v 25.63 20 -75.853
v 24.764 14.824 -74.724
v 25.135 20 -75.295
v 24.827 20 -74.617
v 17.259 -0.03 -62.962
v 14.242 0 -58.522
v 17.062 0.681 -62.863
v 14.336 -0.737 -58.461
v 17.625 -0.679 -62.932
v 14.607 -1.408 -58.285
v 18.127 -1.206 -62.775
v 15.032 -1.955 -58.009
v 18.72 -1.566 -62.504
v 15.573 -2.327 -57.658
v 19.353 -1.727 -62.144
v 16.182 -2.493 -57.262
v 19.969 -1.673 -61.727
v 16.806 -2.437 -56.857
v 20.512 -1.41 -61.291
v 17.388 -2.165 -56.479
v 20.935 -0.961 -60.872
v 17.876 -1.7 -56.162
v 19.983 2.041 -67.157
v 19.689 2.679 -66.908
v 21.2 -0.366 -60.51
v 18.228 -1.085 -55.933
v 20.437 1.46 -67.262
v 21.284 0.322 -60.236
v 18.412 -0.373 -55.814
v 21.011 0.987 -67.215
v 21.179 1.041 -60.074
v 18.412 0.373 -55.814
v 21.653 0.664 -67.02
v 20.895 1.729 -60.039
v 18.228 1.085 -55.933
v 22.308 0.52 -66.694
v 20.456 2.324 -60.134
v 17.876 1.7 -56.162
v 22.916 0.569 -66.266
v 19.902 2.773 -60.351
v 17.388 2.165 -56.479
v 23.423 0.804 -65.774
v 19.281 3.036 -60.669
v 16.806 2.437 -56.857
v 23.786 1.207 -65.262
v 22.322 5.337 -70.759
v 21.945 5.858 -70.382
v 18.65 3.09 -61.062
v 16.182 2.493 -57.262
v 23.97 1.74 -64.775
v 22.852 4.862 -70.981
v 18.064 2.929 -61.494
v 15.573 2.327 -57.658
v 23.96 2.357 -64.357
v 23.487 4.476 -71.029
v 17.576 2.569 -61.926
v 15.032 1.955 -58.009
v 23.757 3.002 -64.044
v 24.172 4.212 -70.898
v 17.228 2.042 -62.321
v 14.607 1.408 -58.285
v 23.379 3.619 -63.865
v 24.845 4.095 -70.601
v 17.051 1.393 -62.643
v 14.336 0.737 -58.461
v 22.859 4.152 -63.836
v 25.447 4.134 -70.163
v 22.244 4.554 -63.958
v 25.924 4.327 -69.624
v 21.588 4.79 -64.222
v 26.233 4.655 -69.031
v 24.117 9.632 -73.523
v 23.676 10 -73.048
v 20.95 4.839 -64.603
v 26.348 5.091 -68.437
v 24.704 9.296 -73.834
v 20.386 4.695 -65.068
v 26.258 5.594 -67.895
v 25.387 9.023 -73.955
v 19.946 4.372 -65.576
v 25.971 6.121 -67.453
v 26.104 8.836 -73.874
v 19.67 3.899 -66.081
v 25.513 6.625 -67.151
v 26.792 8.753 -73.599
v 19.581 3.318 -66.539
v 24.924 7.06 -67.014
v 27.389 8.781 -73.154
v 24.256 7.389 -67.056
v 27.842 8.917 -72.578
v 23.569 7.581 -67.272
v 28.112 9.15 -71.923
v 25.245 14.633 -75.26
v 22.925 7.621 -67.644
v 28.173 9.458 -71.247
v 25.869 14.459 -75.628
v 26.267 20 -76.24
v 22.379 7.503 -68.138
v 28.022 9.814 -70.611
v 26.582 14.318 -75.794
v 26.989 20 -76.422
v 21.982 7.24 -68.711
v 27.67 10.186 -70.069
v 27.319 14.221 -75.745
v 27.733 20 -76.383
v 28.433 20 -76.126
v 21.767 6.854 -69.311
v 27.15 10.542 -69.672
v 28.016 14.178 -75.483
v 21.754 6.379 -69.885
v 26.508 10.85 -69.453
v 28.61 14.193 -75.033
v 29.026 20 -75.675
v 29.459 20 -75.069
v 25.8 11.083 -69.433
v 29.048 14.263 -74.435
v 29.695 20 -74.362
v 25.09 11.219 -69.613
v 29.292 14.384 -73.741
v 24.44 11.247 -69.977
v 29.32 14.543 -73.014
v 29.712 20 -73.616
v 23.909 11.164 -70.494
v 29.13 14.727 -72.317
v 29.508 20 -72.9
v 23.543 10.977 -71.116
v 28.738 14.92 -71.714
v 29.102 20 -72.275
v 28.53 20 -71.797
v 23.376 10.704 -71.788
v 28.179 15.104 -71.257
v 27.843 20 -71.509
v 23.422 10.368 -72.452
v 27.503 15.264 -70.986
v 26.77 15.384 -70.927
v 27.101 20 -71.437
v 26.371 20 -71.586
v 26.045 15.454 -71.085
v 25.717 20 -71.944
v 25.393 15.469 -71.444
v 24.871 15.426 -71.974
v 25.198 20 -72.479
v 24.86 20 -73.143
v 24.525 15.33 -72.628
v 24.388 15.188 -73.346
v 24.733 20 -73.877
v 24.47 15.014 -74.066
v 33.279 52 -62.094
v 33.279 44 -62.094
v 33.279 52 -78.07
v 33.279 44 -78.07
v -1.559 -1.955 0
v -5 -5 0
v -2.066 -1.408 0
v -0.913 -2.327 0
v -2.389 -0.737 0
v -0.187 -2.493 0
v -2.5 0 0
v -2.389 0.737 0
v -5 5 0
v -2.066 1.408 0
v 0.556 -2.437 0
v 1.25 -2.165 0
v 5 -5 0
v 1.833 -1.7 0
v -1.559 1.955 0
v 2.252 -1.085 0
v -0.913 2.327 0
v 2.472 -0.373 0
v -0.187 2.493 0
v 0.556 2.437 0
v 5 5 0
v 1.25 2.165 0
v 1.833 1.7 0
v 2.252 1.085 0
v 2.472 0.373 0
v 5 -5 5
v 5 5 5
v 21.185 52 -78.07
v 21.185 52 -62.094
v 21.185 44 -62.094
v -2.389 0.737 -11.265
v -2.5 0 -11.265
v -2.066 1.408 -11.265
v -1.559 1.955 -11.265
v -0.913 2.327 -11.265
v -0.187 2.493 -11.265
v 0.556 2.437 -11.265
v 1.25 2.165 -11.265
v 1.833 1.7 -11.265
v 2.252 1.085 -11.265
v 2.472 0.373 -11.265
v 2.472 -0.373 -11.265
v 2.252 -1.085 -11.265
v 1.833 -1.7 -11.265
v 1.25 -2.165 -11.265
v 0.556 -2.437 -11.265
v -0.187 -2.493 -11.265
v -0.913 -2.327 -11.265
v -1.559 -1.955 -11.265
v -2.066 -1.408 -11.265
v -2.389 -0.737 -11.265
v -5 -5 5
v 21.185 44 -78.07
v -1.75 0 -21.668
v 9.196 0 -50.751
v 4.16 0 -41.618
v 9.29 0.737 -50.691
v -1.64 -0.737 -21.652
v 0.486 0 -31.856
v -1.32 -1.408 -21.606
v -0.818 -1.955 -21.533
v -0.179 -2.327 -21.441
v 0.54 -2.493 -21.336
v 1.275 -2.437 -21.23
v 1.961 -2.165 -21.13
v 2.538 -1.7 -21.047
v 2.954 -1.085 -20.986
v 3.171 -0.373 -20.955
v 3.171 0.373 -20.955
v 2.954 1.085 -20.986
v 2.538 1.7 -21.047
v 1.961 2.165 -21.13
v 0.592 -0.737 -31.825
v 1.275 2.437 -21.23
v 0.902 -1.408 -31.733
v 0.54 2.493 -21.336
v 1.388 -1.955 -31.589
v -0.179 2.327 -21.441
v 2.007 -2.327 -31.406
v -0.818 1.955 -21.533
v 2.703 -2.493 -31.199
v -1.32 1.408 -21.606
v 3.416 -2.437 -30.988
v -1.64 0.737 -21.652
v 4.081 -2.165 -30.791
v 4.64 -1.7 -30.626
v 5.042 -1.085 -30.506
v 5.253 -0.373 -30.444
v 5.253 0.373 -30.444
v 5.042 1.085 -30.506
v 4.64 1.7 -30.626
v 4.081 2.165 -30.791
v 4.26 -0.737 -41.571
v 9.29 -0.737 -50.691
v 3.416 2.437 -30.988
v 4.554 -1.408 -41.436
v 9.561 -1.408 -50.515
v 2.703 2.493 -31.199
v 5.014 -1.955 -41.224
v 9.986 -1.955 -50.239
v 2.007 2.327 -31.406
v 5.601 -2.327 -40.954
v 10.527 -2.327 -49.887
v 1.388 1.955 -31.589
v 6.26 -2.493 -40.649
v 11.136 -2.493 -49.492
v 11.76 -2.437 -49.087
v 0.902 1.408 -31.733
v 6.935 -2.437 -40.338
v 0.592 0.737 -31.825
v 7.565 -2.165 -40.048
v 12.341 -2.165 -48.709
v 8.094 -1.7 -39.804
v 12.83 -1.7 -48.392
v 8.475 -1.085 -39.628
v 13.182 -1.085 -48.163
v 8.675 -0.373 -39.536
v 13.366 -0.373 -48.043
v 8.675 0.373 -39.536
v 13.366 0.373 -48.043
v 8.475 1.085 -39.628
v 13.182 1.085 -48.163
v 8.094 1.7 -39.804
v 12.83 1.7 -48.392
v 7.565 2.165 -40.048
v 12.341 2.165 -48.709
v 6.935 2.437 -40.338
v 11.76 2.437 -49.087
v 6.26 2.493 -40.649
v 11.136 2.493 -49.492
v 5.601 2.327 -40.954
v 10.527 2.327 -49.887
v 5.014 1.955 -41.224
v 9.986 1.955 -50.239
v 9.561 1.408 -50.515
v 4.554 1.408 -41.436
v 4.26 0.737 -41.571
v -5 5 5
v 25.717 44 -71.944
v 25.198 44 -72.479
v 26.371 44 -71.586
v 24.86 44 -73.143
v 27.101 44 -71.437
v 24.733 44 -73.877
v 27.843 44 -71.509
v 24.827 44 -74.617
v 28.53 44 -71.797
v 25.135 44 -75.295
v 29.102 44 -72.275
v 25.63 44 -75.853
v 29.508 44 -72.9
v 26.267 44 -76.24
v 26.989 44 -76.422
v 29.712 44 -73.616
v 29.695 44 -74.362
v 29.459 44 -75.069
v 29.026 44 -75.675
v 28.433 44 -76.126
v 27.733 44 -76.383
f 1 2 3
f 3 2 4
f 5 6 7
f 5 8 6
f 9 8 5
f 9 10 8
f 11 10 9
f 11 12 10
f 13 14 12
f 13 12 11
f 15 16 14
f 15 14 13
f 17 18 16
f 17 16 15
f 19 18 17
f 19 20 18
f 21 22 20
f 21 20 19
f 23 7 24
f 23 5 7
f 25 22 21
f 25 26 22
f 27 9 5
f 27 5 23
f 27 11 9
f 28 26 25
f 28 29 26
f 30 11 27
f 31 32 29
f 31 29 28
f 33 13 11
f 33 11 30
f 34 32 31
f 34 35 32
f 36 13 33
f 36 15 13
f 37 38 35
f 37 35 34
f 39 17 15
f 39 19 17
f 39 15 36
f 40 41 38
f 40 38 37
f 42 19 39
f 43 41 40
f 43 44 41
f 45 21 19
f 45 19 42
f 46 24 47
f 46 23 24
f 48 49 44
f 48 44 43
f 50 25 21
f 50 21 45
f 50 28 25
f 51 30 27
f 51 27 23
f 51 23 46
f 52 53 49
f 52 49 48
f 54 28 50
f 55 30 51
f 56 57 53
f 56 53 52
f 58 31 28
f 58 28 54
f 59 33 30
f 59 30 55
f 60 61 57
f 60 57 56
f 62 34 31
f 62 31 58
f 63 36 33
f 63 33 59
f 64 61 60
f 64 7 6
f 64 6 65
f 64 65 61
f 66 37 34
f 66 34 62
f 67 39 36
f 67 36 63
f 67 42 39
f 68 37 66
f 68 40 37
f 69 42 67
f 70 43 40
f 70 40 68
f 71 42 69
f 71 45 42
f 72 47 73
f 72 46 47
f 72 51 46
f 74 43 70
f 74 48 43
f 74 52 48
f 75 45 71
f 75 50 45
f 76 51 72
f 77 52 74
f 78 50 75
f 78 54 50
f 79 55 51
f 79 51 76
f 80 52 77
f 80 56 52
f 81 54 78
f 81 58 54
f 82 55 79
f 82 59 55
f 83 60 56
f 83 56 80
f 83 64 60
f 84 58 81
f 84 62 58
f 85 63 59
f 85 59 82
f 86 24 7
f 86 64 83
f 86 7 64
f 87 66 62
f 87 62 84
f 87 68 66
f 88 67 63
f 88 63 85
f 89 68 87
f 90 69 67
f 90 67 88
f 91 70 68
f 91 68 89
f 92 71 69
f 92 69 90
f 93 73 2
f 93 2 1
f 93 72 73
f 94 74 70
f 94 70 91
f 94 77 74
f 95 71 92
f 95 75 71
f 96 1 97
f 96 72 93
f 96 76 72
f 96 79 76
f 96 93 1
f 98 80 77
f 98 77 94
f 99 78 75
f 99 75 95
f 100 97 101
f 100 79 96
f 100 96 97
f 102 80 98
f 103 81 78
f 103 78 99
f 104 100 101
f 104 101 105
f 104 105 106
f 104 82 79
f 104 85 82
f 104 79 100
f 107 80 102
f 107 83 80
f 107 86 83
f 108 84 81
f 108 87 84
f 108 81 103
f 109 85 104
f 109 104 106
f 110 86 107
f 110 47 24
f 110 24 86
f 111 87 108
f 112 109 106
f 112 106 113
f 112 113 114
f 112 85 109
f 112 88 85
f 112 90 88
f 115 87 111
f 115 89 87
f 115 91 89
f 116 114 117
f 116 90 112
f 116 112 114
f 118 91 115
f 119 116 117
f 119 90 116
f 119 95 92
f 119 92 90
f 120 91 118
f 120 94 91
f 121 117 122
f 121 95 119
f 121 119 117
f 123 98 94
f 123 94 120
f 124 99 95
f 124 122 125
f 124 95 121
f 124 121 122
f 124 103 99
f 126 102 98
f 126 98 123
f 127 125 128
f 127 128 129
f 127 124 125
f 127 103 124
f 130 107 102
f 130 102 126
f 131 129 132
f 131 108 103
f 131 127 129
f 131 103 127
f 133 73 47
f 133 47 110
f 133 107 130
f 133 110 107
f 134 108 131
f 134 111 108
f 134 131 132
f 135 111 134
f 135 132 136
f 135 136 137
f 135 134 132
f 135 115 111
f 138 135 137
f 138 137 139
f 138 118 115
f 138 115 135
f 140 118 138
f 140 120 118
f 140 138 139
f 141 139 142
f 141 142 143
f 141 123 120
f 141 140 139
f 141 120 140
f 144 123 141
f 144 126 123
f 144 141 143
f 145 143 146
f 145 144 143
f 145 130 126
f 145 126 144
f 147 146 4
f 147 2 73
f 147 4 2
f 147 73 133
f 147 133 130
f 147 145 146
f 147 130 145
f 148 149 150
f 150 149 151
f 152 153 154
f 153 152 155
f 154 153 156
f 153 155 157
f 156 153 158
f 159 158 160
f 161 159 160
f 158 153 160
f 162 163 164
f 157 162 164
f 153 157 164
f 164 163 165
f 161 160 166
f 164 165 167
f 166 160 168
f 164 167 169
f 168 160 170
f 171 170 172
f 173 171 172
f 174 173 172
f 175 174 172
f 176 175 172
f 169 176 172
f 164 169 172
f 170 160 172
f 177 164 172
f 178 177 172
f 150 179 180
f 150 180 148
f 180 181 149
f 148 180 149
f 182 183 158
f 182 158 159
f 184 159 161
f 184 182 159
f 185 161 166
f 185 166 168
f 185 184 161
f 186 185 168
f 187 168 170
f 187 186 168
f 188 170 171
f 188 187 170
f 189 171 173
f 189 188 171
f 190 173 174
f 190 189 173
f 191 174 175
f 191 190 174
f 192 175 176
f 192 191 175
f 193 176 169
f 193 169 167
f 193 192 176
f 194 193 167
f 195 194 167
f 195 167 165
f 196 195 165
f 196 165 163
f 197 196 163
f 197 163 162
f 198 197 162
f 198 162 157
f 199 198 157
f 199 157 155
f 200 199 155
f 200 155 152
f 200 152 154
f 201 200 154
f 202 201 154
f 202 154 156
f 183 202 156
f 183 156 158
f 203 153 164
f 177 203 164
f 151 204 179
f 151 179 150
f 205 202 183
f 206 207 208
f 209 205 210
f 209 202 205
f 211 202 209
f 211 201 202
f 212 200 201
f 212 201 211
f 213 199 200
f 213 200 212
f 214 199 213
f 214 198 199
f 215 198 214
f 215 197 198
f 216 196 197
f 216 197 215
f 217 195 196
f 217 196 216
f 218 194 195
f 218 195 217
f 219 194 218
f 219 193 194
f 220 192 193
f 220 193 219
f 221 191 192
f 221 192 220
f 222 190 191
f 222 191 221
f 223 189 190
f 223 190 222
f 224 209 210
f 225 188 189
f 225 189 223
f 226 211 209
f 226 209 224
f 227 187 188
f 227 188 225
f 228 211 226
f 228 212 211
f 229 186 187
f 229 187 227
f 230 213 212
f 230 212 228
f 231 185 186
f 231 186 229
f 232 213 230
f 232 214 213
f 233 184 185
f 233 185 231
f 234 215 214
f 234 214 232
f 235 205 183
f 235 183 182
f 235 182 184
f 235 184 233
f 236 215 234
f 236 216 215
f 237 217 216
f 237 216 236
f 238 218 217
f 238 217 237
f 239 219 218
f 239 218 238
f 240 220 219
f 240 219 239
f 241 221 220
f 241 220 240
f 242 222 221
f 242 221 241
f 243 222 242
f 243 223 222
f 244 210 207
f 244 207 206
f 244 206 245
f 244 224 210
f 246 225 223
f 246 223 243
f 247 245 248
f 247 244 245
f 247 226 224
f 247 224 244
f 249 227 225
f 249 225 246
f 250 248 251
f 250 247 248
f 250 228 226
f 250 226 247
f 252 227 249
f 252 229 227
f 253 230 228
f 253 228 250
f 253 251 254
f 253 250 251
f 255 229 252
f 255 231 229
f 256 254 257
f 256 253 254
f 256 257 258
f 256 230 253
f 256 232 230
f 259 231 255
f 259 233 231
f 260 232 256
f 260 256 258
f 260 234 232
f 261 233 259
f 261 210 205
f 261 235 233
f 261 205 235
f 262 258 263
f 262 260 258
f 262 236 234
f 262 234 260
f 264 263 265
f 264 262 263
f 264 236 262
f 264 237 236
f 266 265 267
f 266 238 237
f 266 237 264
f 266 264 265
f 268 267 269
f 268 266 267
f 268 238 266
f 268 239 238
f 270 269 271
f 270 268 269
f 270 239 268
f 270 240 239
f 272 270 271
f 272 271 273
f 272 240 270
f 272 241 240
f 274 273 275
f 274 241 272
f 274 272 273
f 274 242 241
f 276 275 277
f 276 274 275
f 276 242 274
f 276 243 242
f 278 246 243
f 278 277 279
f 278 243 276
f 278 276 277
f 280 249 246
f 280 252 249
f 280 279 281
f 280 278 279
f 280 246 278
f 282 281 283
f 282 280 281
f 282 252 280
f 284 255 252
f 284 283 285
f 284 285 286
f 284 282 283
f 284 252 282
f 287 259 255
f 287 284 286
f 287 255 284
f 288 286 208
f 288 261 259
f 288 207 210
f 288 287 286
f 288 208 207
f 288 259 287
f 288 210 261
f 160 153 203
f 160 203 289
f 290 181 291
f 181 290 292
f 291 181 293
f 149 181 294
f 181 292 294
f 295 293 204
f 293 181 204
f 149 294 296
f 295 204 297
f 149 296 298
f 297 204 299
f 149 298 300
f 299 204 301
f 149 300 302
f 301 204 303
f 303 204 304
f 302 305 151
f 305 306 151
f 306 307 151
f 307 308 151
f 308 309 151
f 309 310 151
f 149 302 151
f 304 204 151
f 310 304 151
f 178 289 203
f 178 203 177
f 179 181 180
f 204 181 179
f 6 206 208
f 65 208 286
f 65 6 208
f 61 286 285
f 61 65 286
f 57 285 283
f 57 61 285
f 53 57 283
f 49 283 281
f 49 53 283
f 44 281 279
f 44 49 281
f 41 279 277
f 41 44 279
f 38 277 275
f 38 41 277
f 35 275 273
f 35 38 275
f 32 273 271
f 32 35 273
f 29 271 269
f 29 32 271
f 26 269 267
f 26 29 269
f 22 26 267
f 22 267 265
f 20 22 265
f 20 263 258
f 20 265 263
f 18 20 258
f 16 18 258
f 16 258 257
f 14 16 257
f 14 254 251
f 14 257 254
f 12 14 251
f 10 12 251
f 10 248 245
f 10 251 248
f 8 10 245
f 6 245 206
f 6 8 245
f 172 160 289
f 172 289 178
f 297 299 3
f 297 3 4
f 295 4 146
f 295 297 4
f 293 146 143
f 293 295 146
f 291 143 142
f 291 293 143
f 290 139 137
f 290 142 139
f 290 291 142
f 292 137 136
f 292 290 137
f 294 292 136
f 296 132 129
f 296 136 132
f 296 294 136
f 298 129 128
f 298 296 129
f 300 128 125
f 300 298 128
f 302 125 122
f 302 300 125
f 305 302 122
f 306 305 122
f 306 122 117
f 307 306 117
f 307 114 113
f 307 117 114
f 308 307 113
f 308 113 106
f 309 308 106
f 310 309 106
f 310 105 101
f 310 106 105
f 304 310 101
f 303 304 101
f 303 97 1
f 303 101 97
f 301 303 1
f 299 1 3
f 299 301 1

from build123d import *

# Parameters (mm, degrees)
SWEEP_1_PROFILE_R = 2.5
SKETCH_10_W       = 10
SKETCH_10_H       = 10
EXTRUDE_1_DEPTH   = 5
SKETCH_11_W       = 12.093454082
SKETCH_11_H       = 15.976124646
EXTRUDE_2_DEPTH   = 8


with BuildPart() as part:
    # 扫描1: sweep along a curve in space
    with BuildLine() as sweep_1_path:
        Line((0, 0, 0), (0, 0, -11.265055353))
        ThreePointArc((11.293060244, 0, -49.389787804), (2.882618559, 0, -31.146129482), (0, 0, -11.265055353))
        Line((11.293060244, 0, -49.389787804), (16.33917105, 0, -57.160117038))
        ThreePointArc((27.231951751, 20, -73.933528397), (24.04153015, 5.857864376, -69.020709954), (16.33917105, 0, -57.160117038))
        Line((27.231951751, 20, -73.933528397), (27.231951751, 44, -73.933528397))
    # 扫描1 profile (on start of the path) → 扫描1 (sweep)
    with BuildSketch(Plane(origin=(0, 0, 0), x_dir=(-1, 0, 0), z_dir=(0, 0, -1))):
        Circle(SWEEP_1_PROFILE_R)
    sweep(path=sweep_1_path.line)

    # 草图10 → 凸台-拉伸1 (add)
    with BuildSketch(Plane.XY):
        Rectangle(SKETCH_10_W, SKETCH_10_H)
    extrude(amount=EXTRUDE_1_DEPTH)

    # 草图11 → 凸台-拉伸2 (add)
    with BuildSketch(Plane(origin=(0, 44, 0), x_dir=(1, 0, 0), z_dir=(0, 1, 0))):
        with Locations((27.231951751, 70.082405306)):
            Rectangle(SKETCH_11_W, SKETCH_11_H)
    extrude(amount=EXTRUDE_2_DEPTH)


solid = part.part
